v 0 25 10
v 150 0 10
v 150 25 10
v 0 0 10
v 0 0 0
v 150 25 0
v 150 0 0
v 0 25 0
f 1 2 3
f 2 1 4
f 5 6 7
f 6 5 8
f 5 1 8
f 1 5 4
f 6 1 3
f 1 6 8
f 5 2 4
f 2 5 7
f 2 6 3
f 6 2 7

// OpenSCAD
// Basic Sizeparameters ------------------------------
magic_1=1;

// -- Dimensions relatet ----------

Length=500; // x-Axis
Width= Length/20; // y-Axis
Heigth=6; // z-Axis


// -- Math relatet ----------
NUMSYS=10; // Numeral System Dec, HEX, Octal
ANZ_NSy=NUMSYS-1; // Number of Fields of Body, Dec> 9=10-1

// -- text relatet ----------
Lttr_Siz=3; // Basic Height of all Text
Head_Text_HP=3; // Teterms the heigh of The Head of the Rulers
BASE=ANZ_NSy*2; // determines The length of the Field
FONT="Linux Libertine Mono O:style=Mono";

// Basic Sizeparameters ====================


// Head ------------------------------

Head_Length=Lttr_Siz*Head_Text_HP; // x-Axis, Heigh of the Head of the Ruler 
Head_Width=25;// y-Axis, Width of the Ruler 
Head_Heigth=Heigth;  // z-Axis, Thickness of the Ruler

// Head ====================

// Body ------------------------------

Body_Length=(ANZ_NSy*ANZ_NSy+ANZ_NSy)/2*Lttr_Siz;  // x-Axis
Body_Width_Num=Width/2; // y-Axis width for the Numbercount
Body_Width_Tri=Width/2; // y-Axis width for the Trianglepattern
Body_Heigth=Head_Heigth; // z-Axis
Body_Split_Ratio=4; // determines the Ratio in whitch the width gets split betweeen the number column and the column whit the Triangles


// Body ====================

// Foot ------------------------------

Foot_Length=Lttr_Siz*2;  // x-Axis
Foot_Width=1; // y-Axis
Foot_Heigth=Head_Heigth; // z-Axis

// Foot ====================

/*length=1000; //x Axis
width=20; //y Axis
heigth=8; //z Axis*/

// Grid ------------------------------
Whide=Lttr_Siz/3;

// Grid ====================

RULER ();
module RULER (){
    union(){
    HEAD();
        translate([Head_Length,Width/Body_Split_Ratio*3,0]){
        BODY_NUM();
        }
        translate([Head_Length,0,0]){
        BODY_TRIA();
        }
        translate([Head_Length+Body_Length,0,0]){
            FOOT();
        }
    }
}

module HEAD(){
    color("Blue", 1.0){
        difference(){
            cube([Head_Length,Width,10]);
        }
    }
}

module BODY_NUM(){
    color("Gold", 1.0){
        difference(){
            cube([Body_Length,Width/Body_Split_Ratio,10]);
        }
    }
}

module BODY_TRIA(){
    color("Khaki", 1.0){
        difference(){
            cube([Body_Length,Width/Body_Split_Ratio*3,10]);
        }
    }
}

module FOOT(){
    color("Green", 1.0){
        difference(){
            cube([Foot_Length,Width,10]);
        }
    }
}    

// Stencils ------------------------------
Stenc_Heigth=Heigth/6;
// -- Head ------------------------------

module Stenc_Head(){
    color("Pink", 1.0){
        }
    }
// ---- Text ------------------------------

TESTING();
module TESTING(){
    //Len=1;
    Whd=Width/Body_Split_Ratio;
    //hilf=1;
    translate([0,0,10]){
        Stepp=Lttr_Siz*2;
        for(i=[1:9]){
            translate([0,-Stepp*(i-1),i*3]){
                echo("Stepp_0", Stepp);
                Stenc_Head_Text(i);
                Stenc_Body_Num(i,Whd);
            }
            Stepp=Stepp*i/2;
                echo("Stepp_1", Stepp);
        }
    }
    } // Just for easy dirty Testing


module Stenc_Head_Text(END){
    valign =  "center"; // Vertical Alignment
    halign =  "center"; // Horizontal Alignment
    
    color("PaleVioletRed", 1.0){
        for(i=[1:END]){
            translate([0,-i*Lttr_Siz*2+Lttr_Siz,0]){
            text(str(i), 
            font =FONT, // Liberation Sans 
            size = Lttr_Siz ,
            halign="center",
            valign="center");
            translate([0,-5,0]){
            //    cube([10,10,10]); Testing the units for Font dimensions
                }
            }
        }
    }
}
// == Head ====================

// -- Body ------------------------------

module Stenc_Body_Num(Len,Whd){
    DIM=Lttr_Siz*2;
    //Whd;
    for(i=[1:Len]){
        translate([0,-DIM*i,0]){
        cube([Width/Body_Split_Ratio,DIM,Stenc_Heigth]);
        }
    }
    }

// ---- Text ------------------------------

// == Body ====================

// -- Foot ------------------------------

// ---- Text ------------------------------

// == Foot ====================

/*



// Head old ------------------------------
Base_length=length/45;
Base_width=width/2;
Base_heigth=heigth/4;

length_head=Base_length*3; //x Axis
width_head=20; //y Axis
heigth_head=5; //z Axis
echo("Base_length",Base_length);


Ruler_Base();
module Ruler_Base(){
    difference(){
        cube([length,width,heigth],center=false);
        translate([0,0,heigth-heigth/4]){
            Stencil_Head();
            Stencil_Numb();
            }
        }
    }


// Stencils ------------------------------
module Stencil_Numb(){
    Transl_Stenc=0;
    for(i=[0:8]){
        echo("i from Stencil_Numb", i);        
        echo("Transl_Stenc",Transl_Stenc);
        translate([Transl_Stenc*i/2+Base_length*3,0,i*1]){
            #cube([Base_length*(i+1),width/2,heigth/4],center=false);
            translate([0,0,i*20]){
                #Text();
            }
        }
        Transl_Stenc=Base_length*i+Transl_Stenc*i+Base_length;
                echo("Transl_Stenc_K",Transl_Stenc);
    }
}

Stencil_Head();
module Stencil_Head(){
    cube([Base_length*3,width,heigth/4],center=false);
    Text();
    } 

module Stencil_Triangle(){
    
    }

// Text ------------------------------
//Text();
module Text(){
text = "Index";
 font = "Liberation Sans";
 
 valign = [
   //[  0, "top"],
   [ 0, "center"],
   //[ 75, "baseline"],
   //[110, "bottom"]
 ];

 halign = [
   //[10, "left"],
   [0, "center"],
   //[90, "right"]
 ];
    
 for (a = valign) {
   rotate([0,0,90]){
         translate([width/2,0 - a[0]-(Base_length*3)/2,-1 ]) {
         color("red") cube([135, 1, 0.1]);
         color("blue") cube([1, 20, 0.1]);
         linear_extrude(height = Base_heigth) {
            text(text = str(text), 
             font = font, 
             size = Base_length/4.7 ,
             halign=a[1], 
             valign =a[1] );
         }
       }
     }
    }
}

//Numbers

numbering(9);
module numbering(Size){
    End=Size;
    font = "Liberation Sans";
    valign = [
        //[  0, "top"],
        [ 0, "center"],
        //[ 75, "baseline"],
        //[110, "bottom"]
    ];
    for(a=[0:End]){
        translate([0,-a*Base_length/4.7,0]){
    text(text = str(a), 
             font = font, 
             size = Base_length/4.7 ,
             halign=a[1], 
             valign =a[1] );
        }
    }
}
// Text ====================

// Strencils ====================
  
 // Helpers  
/*

// Numbers ------------------------------

Number of rows for Numbers on ruler 45
--> 5 Rows for Head == 50 Rows
// Numbers ====================
 
// code snipets ------------------------------

cube([length,width,heigth]);    
length
width
heigth

// code snipets ====================



*/
